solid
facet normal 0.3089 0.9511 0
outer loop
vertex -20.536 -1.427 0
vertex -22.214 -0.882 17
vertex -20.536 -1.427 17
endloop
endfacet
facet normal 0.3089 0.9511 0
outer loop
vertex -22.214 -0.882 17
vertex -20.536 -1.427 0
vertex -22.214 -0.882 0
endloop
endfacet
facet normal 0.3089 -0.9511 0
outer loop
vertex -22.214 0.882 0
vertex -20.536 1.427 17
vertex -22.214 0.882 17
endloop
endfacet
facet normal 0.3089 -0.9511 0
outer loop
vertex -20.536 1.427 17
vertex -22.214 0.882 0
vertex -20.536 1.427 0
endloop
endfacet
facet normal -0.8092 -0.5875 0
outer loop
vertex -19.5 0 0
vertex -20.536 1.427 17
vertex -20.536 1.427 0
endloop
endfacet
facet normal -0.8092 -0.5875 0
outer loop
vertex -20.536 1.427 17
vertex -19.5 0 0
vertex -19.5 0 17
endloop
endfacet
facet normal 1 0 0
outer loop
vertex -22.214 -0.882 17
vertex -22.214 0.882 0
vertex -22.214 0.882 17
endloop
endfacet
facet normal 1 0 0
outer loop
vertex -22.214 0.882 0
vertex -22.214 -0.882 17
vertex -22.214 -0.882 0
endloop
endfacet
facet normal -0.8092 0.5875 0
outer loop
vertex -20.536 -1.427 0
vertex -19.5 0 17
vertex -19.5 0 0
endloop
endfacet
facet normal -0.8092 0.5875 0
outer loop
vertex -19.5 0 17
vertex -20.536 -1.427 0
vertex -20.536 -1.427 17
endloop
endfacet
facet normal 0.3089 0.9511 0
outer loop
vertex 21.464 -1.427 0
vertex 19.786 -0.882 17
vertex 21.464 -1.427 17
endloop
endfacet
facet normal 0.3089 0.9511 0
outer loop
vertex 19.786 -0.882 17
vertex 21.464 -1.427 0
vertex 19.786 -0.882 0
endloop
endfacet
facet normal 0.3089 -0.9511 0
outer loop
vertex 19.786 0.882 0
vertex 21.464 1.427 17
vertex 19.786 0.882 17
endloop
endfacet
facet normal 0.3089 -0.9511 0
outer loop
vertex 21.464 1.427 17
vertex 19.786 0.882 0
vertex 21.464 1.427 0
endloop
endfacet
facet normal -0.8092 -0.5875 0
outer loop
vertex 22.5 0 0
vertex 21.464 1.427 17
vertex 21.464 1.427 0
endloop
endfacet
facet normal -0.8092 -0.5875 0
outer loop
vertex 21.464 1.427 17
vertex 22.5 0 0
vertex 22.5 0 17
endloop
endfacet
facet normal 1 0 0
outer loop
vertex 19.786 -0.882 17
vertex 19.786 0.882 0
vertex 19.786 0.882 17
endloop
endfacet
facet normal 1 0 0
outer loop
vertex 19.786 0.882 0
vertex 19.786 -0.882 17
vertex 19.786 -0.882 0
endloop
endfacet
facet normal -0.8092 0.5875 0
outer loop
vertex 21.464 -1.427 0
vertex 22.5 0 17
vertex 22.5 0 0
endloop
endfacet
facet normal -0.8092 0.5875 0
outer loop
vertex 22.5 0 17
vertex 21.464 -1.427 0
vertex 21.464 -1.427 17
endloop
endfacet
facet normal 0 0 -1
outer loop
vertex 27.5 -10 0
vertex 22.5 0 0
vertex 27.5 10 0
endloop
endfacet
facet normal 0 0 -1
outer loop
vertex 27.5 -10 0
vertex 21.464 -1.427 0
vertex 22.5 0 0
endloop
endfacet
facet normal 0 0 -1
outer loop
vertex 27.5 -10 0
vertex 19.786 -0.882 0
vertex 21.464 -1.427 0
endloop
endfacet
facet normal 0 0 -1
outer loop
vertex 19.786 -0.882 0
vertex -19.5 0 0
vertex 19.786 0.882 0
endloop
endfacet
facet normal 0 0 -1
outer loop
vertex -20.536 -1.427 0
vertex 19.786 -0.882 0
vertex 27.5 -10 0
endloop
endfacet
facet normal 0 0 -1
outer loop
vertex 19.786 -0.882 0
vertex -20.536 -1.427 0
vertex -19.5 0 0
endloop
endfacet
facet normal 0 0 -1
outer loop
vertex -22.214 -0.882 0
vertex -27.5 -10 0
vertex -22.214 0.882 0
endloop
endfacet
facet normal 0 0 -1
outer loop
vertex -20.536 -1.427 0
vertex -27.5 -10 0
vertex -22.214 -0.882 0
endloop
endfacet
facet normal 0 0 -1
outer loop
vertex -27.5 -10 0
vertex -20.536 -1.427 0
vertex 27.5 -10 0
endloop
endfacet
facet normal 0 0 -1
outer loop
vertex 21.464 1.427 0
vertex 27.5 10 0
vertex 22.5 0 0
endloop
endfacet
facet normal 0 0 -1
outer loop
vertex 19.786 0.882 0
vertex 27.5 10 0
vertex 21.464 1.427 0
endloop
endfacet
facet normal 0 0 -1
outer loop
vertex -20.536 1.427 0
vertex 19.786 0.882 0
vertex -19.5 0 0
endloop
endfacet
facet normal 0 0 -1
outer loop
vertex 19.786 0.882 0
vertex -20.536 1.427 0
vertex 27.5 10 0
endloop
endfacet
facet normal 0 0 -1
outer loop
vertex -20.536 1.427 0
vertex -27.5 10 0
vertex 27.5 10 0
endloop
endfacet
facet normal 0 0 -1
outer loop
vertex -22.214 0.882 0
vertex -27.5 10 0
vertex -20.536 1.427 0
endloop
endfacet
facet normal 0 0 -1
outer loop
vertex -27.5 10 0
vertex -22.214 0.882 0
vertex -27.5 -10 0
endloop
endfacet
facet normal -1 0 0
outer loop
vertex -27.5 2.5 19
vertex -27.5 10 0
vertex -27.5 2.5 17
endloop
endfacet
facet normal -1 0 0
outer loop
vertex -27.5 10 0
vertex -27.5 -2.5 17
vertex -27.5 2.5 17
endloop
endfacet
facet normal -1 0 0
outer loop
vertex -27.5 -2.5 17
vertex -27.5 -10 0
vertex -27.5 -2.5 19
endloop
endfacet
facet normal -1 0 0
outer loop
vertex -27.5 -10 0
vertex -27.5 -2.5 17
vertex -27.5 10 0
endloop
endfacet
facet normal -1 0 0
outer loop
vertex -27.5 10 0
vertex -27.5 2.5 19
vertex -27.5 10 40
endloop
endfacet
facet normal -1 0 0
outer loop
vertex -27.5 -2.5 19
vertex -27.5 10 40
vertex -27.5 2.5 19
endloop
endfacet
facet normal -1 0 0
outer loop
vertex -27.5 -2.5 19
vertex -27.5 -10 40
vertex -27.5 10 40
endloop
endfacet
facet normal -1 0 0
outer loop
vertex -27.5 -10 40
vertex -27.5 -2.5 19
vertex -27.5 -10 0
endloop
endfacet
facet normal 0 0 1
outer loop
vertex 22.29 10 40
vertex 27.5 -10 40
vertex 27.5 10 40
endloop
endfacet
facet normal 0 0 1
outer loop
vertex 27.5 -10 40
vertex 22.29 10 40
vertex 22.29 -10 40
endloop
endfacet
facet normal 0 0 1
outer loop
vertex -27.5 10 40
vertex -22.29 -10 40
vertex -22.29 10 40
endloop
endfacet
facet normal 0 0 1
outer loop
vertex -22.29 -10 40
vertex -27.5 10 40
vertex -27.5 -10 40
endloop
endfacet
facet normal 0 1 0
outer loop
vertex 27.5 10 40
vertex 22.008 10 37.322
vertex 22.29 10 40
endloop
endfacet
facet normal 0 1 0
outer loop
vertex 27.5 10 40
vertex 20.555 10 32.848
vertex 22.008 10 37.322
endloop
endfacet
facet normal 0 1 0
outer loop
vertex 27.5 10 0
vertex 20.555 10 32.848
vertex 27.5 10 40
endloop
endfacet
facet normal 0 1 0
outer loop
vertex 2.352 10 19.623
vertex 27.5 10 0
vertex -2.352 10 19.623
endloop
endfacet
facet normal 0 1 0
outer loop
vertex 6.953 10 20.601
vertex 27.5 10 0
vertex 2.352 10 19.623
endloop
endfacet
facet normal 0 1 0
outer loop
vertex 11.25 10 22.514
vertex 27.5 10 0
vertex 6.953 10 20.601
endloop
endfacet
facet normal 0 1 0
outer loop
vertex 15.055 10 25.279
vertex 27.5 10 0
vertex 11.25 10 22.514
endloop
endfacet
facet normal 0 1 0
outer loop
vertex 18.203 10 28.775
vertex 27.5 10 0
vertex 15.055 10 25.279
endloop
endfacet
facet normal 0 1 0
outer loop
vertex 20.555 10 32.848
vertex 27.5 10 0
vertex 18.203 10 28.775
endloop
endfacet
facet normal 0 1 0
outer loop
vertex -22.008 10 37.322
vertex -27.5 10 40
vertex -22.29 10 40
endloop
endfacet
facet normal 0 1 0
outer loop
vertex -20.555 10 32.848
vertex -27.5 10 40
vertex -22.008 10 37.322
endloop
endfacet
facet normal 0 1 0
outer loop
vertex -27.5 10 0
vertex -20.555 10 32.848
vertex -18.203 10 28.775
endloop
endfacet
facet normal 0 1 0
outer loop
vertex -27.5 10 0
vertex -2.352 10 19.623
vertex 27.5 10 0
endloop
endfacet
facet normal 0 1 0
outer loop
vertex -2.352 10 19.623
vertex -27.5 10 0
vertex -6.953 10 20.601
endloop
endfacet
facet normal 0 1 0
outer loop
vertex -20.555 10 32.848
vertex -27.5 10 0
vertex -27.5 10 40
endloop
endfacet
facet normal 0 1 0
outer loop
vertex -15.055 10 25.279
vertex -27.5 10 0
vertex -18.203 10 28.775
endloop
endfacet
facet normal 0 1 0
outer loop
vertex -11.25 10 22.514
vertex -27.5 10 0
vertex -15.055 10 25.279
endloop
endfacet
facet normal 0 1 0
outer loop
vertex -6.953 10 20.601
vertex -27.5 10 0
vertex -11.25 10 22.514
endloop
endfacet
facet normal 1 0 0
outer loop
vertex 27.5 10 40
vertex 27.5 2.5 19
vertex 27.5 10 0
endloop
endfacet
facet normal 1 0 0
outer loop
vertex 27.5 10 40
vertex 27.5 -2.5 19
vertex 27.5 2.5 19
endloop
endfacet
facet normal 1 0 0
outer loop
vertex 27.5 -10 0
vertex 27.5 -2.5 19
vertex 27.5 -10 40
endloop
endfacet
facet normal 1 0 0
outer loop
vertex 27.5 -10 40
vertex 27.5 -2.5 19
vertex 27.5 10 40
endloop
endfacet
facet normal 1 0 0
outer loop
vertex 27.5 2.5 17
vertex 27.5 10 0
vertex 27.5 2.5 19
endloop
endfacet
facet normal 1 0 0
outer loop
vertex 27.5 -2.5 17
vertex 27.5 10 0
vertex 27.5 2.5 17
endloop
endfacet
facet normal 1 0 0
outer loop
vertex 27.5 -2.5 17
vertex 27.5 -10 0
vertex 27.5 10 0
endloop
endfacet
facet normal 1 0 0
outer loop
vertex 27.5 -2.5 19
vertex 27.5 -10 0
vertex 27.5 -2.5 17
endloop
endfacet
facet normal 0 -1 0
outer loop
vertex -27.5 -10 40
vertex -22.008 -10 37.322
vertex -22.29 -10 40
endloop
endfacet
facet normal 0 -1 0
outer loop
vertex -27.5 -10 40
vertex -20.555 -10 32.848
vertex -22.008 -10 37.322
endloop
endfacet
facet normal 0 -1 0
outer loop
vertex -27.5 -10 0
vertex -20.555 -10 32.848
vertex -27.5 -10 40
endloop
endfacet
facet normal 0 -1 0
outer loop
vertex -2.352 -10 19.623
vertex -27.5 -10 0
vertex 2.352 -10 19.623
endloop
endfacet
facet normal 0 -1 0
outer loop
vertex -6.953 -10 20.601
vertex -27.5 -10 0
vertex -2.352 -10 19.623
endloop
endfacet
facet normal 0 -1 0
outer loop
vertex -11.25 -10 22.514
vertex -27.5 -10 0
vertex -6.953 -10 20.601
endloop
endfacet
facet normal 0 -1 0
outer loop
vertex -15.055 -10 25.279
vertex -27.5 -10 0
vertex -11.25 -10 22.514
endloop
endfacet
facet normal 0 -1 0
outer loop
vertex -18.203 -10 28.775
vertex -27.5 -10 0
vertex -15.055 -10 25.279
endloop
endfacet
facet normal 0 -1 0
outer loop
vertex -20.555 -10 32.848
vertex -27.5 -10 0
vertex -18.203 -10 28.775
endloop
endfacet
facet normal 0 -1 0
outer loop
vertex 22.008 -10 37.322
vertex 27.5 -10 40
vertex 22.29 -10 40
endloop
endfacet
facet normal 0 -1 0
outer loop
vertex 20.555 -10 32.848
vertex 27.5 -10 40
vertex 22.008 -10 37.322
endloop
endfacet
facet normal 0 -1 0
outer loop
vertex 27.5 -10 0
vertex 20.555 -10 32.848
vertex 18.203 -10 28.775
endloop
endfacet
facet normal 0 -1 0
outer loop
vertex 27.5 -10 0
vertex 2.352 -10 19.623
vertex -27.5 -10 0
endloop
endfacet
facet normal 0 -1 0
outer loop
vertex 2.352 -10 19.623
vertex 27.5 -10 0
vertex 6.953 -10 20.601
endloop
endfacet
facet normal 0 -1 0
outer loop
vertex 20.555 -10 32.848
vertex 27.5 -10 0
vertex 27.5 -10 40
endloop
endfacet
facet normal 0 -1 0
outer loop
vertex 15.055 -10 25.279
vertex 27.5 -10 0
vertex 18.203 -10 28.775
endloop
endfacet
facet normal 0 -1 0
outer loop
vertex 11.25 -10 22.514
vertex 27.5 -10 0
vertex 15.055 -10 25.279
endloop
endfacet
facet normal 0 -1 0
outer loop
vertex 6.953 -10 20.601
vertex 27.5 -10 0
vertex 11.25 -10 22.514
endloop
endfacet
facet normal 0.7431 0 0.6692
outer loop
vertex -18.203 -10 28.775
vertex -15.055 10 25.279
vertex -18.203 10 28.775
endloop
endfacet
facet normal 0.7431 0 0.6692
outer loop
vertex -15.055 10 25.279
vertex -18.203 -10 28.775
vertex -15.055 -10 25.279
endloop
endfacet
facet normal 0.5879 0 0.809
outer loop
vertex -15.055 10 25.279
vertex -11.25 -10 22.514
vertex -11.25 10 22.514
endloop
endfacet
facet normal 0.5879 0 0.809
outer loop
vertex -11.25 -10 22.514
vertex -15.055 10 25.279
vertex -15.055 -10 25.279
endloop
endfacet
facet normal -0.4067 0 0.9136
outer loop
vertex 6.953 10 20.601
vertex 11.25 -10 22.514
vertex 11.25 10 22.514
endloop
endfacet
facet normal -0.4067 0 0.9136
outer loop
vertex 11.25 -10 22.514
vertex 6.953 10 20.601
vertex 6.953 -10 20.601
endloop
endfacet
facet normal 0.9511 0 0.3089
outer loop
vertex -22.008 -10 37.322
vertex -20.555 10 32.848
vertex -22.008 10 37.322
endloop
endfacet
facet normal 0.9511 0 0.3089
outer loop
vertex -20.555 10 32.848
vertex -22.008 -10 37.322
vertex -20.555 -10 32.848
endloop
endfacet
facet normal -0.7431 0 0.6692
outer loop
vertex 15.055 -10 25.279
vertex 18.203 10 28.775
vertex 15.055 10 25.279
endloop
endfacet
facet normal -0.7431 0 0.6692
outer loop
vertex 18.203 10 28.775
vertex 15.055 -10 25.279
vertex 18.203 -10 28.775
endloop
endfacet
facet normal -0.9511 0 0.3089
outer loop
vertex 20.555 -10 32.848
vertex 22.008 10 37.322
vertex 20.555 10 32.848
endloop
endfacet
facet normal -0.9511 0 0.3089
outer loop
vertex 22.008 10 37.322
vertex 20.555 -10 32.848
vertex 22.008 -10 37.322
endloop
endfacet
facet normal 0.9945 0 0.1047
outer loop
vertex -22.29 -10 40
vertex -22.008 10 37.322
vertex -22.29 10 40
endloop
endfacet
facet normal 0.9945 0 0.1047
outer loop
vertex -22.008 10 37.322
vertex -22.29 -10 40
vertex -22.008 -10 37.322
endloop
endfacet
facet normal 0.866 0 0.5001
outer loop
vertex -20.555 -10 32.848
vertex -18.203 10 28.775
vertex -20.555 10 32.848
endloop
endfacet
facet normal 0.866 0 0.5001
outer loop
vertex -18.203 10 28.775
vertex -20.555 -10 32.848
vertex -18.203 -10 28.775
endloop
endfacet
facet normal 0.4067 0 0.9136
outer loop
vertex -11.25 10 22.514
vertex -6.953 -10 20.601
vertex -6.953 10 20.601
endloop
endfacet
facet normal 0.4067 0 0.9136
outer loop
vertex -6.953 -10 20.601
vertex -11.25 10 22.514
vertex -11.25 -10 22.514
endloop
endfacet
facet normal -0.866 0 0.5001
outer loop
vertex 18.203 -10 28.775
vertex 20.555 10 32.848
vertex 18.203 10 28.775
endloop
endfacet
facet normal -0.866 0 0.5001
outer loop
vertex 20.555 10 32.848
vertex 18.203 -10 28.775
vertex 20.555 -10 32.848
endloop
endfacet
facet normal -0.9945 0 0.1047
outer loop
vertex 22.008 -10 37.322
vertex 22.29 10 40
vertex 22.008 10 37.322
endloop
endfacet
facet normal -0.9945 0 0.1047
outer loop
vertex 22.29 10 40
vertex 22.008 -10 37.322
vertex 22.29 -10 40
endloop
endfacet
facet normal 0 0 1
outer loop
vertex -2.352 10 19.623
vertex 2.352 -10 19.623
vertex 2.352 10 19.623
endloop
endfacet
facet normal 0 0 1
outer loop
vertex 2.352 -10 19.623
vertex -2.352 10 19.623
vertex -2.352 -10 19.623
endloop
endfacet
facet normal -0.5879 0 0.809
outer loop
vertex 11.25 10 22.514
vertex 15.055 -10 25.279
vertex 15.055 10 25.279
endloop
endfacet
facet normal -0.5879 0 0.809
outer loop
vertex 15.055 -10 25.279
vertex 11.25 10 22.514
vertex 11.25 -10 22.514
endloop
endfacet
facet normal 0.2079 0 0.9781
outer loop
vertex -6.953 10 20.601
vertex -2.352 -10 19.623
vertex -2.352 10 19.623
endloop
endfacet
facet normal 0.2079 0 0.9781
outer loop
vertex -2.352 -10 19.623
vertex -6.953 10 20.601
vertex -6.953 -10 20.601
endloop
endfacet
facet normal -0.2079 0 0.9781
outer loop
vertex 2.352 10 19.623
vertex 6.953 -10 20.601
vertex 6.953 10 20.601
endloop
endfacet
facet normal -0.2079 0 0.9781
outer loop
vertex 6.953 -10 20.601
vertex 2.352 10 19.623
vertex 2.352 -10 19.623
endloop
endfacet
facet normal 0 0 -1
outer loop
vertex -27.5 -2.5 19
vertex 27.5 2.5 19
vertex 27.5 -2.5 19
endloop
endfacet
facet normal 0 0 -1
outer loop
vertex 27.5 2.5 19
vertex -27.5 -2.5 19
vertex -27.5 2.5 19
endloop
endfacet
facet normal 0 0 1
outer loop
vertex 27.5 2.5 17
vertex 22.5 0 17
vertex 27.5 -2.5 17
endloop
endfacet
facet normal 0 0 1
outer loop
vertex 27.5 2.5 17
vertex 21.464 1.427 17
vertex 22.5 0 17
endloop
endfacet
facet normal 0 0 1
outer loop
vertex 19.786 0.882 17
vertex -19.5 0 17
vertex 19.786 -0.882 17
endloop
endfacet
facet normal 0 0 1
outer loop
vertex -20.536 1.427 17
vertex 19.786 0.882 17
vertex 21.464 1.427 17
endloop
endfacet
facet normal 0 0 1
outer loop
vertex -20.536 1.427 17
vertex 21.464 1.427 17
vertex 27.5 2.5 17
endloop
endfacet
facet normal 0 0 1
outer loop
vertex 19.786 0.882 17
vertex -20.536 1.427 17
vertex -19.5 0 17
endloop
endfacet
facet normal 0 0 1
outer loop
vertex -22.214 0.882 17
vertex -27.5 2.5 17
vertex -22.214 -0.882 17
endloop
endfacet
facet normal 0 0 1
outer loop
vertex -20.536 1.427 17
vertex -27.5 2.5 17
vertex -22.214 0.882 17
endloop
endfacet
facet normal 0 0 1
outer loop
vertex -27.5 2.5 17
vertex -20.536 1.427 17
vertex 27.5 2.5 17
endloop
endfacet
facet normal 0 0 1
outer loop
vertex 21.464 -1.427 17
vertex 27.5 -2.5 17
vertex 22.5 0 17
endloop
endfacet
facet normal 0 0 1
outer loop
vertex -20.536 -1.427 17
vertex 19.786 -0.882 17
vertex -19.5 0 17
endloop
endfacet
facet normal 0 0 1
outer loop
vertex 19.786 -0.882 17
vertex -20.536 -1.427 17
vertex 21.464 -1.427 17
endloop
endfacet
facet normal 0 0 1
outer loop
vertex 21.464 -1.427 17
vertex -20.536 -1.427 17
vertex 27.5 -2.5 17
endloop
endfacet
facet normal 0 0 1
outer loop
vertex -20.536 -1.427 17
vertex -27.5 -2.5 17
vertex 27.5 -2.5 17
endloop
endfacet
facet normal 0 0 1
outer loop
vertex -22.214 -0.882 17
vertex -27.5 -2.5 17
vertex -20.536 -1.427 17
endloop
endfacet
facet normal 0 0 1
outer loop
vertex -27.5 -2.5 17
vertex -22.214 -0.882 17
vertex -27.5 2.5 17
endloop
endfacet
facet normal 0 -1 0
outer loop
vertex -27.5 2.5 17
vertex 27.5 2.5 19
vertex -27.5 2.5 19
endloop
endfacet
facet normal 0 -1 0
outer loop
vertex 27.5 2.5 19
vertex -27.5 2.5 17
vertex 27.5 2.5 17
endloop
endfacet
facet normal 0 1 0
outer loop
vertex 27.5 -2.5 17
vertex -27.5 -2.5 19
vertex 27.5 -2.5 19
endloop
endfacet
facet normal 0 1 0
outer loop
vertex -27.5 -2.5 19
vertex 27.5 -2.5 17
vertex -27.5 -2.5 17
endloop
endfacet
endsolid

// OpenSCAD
width = 55;

difference() {
  // Body
  linear_extrude(40) {
    square([width, 20], center = true);
  }

  // Pump body cutout
  translate([0, 0, 42]) {
    rotate([90, 0, 0]) {
      cylinder(d = 45, h = 22, center = true);
    }
  }

  // Pump retention cable tie hole
  translate([0, 0, 18]) {
    cube([width + 1, 5, 2], center = true);
  }

  // Case mounting holes
  dx = 42 / 2;
  for (x = [-dx, dx]) {
    translate([x, 0, -0.1]) {
      cylinder(d = 3, h = 18, $fn = 5);
    }
  }
}
